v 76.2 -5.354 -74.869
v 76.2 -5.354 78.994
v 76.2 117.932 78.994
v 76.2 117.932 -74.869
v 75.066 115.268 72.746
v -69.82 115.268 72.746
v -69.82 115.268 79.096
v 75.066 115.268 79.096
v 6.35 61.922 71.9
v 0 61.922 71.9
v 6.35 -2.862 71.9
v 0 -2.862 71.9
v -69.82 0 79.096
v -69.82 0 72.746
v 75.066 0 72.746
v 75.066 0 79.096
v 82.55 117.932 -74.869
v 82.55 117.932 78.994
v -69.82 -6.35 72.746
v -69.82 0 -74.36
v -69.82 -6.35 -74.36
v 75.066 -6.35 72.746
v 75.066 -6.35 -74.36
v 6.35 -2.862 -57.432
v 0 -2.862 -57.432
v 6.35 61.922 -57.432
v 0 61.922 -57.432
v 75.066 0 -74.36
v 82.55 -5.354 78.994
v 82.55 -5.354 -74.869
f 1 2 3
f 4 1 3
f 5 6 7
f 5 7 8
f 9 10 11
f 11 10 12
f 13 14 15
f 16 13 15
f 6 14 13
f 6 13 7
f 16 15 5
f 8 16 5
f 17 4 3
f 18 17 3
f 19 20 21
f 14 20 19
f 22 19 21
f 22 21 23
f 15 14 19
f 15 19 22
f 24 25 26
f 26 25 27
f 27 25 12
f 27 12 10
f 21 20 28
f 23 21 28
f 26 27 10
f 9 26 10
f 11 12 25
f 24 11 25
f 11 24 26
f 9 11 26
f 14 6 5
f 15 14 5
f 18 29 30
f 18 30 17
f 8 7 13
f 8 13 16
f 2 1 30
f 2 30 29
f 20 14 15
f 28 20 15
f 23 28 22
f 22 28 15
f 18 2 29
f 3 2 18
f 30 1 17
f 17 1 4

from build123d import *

# Parameters (mm, degrees)
F0_W     = 144.885704
F0_H     = 147.105403
F1_DEPTH = 6.35
F2_W     = 144.885704
F2_H     = 115.267791
F3_DEPTH = 6.35
F5_DEPTH = 6.35
F7_W     = 123.286622
F7_H     = 153.862923
F8_DEPTH = 6.35


with BuildPart() as f1:
    # F0 (on Front) → F1 (new body)
    with BuildSketch(Plane.XZ):
        with Locations((2.623282, -0.807163)):
            Rectangle(F0_W, F0_H)
    extrude(amount=F1_DEPTH)


with BuildPart() as f3:
    # F2 (on face) → F3 (new body)
    with BuildSketch(Plane.XY.offset(72.745539)):
        with Locations((2.623282, 57.633895)):
            Rectangle(F2_W, F2_H)
    extrude(amount=F3_DEPTH)


with BuildPart() as f5:
    # F4 (on Right) → F5 (new body)
    with BuildSketch(Plane.YZ):
        Polygon((-2.86189, 71.89966), (-2.86189, -57.431653), (61.921746, -57.431653), (61.921746, 11.816087), (61.921746, 71.89966), align=None)
    extrude(amount=F5_DEPTH)


with BuildPart() as f8:
    # F7 (on offset) → F8 (new body)
    with BuildSketch(Plane.YZ.offset(76.2)):
        with Locations((56.288949, 2.062067)):
            Rectangle(F7_W, F7_H)
    extrude(amount=F8_DEPTH)


solid = Compound([f1.part, f3.part, f5.part, f8.part])
